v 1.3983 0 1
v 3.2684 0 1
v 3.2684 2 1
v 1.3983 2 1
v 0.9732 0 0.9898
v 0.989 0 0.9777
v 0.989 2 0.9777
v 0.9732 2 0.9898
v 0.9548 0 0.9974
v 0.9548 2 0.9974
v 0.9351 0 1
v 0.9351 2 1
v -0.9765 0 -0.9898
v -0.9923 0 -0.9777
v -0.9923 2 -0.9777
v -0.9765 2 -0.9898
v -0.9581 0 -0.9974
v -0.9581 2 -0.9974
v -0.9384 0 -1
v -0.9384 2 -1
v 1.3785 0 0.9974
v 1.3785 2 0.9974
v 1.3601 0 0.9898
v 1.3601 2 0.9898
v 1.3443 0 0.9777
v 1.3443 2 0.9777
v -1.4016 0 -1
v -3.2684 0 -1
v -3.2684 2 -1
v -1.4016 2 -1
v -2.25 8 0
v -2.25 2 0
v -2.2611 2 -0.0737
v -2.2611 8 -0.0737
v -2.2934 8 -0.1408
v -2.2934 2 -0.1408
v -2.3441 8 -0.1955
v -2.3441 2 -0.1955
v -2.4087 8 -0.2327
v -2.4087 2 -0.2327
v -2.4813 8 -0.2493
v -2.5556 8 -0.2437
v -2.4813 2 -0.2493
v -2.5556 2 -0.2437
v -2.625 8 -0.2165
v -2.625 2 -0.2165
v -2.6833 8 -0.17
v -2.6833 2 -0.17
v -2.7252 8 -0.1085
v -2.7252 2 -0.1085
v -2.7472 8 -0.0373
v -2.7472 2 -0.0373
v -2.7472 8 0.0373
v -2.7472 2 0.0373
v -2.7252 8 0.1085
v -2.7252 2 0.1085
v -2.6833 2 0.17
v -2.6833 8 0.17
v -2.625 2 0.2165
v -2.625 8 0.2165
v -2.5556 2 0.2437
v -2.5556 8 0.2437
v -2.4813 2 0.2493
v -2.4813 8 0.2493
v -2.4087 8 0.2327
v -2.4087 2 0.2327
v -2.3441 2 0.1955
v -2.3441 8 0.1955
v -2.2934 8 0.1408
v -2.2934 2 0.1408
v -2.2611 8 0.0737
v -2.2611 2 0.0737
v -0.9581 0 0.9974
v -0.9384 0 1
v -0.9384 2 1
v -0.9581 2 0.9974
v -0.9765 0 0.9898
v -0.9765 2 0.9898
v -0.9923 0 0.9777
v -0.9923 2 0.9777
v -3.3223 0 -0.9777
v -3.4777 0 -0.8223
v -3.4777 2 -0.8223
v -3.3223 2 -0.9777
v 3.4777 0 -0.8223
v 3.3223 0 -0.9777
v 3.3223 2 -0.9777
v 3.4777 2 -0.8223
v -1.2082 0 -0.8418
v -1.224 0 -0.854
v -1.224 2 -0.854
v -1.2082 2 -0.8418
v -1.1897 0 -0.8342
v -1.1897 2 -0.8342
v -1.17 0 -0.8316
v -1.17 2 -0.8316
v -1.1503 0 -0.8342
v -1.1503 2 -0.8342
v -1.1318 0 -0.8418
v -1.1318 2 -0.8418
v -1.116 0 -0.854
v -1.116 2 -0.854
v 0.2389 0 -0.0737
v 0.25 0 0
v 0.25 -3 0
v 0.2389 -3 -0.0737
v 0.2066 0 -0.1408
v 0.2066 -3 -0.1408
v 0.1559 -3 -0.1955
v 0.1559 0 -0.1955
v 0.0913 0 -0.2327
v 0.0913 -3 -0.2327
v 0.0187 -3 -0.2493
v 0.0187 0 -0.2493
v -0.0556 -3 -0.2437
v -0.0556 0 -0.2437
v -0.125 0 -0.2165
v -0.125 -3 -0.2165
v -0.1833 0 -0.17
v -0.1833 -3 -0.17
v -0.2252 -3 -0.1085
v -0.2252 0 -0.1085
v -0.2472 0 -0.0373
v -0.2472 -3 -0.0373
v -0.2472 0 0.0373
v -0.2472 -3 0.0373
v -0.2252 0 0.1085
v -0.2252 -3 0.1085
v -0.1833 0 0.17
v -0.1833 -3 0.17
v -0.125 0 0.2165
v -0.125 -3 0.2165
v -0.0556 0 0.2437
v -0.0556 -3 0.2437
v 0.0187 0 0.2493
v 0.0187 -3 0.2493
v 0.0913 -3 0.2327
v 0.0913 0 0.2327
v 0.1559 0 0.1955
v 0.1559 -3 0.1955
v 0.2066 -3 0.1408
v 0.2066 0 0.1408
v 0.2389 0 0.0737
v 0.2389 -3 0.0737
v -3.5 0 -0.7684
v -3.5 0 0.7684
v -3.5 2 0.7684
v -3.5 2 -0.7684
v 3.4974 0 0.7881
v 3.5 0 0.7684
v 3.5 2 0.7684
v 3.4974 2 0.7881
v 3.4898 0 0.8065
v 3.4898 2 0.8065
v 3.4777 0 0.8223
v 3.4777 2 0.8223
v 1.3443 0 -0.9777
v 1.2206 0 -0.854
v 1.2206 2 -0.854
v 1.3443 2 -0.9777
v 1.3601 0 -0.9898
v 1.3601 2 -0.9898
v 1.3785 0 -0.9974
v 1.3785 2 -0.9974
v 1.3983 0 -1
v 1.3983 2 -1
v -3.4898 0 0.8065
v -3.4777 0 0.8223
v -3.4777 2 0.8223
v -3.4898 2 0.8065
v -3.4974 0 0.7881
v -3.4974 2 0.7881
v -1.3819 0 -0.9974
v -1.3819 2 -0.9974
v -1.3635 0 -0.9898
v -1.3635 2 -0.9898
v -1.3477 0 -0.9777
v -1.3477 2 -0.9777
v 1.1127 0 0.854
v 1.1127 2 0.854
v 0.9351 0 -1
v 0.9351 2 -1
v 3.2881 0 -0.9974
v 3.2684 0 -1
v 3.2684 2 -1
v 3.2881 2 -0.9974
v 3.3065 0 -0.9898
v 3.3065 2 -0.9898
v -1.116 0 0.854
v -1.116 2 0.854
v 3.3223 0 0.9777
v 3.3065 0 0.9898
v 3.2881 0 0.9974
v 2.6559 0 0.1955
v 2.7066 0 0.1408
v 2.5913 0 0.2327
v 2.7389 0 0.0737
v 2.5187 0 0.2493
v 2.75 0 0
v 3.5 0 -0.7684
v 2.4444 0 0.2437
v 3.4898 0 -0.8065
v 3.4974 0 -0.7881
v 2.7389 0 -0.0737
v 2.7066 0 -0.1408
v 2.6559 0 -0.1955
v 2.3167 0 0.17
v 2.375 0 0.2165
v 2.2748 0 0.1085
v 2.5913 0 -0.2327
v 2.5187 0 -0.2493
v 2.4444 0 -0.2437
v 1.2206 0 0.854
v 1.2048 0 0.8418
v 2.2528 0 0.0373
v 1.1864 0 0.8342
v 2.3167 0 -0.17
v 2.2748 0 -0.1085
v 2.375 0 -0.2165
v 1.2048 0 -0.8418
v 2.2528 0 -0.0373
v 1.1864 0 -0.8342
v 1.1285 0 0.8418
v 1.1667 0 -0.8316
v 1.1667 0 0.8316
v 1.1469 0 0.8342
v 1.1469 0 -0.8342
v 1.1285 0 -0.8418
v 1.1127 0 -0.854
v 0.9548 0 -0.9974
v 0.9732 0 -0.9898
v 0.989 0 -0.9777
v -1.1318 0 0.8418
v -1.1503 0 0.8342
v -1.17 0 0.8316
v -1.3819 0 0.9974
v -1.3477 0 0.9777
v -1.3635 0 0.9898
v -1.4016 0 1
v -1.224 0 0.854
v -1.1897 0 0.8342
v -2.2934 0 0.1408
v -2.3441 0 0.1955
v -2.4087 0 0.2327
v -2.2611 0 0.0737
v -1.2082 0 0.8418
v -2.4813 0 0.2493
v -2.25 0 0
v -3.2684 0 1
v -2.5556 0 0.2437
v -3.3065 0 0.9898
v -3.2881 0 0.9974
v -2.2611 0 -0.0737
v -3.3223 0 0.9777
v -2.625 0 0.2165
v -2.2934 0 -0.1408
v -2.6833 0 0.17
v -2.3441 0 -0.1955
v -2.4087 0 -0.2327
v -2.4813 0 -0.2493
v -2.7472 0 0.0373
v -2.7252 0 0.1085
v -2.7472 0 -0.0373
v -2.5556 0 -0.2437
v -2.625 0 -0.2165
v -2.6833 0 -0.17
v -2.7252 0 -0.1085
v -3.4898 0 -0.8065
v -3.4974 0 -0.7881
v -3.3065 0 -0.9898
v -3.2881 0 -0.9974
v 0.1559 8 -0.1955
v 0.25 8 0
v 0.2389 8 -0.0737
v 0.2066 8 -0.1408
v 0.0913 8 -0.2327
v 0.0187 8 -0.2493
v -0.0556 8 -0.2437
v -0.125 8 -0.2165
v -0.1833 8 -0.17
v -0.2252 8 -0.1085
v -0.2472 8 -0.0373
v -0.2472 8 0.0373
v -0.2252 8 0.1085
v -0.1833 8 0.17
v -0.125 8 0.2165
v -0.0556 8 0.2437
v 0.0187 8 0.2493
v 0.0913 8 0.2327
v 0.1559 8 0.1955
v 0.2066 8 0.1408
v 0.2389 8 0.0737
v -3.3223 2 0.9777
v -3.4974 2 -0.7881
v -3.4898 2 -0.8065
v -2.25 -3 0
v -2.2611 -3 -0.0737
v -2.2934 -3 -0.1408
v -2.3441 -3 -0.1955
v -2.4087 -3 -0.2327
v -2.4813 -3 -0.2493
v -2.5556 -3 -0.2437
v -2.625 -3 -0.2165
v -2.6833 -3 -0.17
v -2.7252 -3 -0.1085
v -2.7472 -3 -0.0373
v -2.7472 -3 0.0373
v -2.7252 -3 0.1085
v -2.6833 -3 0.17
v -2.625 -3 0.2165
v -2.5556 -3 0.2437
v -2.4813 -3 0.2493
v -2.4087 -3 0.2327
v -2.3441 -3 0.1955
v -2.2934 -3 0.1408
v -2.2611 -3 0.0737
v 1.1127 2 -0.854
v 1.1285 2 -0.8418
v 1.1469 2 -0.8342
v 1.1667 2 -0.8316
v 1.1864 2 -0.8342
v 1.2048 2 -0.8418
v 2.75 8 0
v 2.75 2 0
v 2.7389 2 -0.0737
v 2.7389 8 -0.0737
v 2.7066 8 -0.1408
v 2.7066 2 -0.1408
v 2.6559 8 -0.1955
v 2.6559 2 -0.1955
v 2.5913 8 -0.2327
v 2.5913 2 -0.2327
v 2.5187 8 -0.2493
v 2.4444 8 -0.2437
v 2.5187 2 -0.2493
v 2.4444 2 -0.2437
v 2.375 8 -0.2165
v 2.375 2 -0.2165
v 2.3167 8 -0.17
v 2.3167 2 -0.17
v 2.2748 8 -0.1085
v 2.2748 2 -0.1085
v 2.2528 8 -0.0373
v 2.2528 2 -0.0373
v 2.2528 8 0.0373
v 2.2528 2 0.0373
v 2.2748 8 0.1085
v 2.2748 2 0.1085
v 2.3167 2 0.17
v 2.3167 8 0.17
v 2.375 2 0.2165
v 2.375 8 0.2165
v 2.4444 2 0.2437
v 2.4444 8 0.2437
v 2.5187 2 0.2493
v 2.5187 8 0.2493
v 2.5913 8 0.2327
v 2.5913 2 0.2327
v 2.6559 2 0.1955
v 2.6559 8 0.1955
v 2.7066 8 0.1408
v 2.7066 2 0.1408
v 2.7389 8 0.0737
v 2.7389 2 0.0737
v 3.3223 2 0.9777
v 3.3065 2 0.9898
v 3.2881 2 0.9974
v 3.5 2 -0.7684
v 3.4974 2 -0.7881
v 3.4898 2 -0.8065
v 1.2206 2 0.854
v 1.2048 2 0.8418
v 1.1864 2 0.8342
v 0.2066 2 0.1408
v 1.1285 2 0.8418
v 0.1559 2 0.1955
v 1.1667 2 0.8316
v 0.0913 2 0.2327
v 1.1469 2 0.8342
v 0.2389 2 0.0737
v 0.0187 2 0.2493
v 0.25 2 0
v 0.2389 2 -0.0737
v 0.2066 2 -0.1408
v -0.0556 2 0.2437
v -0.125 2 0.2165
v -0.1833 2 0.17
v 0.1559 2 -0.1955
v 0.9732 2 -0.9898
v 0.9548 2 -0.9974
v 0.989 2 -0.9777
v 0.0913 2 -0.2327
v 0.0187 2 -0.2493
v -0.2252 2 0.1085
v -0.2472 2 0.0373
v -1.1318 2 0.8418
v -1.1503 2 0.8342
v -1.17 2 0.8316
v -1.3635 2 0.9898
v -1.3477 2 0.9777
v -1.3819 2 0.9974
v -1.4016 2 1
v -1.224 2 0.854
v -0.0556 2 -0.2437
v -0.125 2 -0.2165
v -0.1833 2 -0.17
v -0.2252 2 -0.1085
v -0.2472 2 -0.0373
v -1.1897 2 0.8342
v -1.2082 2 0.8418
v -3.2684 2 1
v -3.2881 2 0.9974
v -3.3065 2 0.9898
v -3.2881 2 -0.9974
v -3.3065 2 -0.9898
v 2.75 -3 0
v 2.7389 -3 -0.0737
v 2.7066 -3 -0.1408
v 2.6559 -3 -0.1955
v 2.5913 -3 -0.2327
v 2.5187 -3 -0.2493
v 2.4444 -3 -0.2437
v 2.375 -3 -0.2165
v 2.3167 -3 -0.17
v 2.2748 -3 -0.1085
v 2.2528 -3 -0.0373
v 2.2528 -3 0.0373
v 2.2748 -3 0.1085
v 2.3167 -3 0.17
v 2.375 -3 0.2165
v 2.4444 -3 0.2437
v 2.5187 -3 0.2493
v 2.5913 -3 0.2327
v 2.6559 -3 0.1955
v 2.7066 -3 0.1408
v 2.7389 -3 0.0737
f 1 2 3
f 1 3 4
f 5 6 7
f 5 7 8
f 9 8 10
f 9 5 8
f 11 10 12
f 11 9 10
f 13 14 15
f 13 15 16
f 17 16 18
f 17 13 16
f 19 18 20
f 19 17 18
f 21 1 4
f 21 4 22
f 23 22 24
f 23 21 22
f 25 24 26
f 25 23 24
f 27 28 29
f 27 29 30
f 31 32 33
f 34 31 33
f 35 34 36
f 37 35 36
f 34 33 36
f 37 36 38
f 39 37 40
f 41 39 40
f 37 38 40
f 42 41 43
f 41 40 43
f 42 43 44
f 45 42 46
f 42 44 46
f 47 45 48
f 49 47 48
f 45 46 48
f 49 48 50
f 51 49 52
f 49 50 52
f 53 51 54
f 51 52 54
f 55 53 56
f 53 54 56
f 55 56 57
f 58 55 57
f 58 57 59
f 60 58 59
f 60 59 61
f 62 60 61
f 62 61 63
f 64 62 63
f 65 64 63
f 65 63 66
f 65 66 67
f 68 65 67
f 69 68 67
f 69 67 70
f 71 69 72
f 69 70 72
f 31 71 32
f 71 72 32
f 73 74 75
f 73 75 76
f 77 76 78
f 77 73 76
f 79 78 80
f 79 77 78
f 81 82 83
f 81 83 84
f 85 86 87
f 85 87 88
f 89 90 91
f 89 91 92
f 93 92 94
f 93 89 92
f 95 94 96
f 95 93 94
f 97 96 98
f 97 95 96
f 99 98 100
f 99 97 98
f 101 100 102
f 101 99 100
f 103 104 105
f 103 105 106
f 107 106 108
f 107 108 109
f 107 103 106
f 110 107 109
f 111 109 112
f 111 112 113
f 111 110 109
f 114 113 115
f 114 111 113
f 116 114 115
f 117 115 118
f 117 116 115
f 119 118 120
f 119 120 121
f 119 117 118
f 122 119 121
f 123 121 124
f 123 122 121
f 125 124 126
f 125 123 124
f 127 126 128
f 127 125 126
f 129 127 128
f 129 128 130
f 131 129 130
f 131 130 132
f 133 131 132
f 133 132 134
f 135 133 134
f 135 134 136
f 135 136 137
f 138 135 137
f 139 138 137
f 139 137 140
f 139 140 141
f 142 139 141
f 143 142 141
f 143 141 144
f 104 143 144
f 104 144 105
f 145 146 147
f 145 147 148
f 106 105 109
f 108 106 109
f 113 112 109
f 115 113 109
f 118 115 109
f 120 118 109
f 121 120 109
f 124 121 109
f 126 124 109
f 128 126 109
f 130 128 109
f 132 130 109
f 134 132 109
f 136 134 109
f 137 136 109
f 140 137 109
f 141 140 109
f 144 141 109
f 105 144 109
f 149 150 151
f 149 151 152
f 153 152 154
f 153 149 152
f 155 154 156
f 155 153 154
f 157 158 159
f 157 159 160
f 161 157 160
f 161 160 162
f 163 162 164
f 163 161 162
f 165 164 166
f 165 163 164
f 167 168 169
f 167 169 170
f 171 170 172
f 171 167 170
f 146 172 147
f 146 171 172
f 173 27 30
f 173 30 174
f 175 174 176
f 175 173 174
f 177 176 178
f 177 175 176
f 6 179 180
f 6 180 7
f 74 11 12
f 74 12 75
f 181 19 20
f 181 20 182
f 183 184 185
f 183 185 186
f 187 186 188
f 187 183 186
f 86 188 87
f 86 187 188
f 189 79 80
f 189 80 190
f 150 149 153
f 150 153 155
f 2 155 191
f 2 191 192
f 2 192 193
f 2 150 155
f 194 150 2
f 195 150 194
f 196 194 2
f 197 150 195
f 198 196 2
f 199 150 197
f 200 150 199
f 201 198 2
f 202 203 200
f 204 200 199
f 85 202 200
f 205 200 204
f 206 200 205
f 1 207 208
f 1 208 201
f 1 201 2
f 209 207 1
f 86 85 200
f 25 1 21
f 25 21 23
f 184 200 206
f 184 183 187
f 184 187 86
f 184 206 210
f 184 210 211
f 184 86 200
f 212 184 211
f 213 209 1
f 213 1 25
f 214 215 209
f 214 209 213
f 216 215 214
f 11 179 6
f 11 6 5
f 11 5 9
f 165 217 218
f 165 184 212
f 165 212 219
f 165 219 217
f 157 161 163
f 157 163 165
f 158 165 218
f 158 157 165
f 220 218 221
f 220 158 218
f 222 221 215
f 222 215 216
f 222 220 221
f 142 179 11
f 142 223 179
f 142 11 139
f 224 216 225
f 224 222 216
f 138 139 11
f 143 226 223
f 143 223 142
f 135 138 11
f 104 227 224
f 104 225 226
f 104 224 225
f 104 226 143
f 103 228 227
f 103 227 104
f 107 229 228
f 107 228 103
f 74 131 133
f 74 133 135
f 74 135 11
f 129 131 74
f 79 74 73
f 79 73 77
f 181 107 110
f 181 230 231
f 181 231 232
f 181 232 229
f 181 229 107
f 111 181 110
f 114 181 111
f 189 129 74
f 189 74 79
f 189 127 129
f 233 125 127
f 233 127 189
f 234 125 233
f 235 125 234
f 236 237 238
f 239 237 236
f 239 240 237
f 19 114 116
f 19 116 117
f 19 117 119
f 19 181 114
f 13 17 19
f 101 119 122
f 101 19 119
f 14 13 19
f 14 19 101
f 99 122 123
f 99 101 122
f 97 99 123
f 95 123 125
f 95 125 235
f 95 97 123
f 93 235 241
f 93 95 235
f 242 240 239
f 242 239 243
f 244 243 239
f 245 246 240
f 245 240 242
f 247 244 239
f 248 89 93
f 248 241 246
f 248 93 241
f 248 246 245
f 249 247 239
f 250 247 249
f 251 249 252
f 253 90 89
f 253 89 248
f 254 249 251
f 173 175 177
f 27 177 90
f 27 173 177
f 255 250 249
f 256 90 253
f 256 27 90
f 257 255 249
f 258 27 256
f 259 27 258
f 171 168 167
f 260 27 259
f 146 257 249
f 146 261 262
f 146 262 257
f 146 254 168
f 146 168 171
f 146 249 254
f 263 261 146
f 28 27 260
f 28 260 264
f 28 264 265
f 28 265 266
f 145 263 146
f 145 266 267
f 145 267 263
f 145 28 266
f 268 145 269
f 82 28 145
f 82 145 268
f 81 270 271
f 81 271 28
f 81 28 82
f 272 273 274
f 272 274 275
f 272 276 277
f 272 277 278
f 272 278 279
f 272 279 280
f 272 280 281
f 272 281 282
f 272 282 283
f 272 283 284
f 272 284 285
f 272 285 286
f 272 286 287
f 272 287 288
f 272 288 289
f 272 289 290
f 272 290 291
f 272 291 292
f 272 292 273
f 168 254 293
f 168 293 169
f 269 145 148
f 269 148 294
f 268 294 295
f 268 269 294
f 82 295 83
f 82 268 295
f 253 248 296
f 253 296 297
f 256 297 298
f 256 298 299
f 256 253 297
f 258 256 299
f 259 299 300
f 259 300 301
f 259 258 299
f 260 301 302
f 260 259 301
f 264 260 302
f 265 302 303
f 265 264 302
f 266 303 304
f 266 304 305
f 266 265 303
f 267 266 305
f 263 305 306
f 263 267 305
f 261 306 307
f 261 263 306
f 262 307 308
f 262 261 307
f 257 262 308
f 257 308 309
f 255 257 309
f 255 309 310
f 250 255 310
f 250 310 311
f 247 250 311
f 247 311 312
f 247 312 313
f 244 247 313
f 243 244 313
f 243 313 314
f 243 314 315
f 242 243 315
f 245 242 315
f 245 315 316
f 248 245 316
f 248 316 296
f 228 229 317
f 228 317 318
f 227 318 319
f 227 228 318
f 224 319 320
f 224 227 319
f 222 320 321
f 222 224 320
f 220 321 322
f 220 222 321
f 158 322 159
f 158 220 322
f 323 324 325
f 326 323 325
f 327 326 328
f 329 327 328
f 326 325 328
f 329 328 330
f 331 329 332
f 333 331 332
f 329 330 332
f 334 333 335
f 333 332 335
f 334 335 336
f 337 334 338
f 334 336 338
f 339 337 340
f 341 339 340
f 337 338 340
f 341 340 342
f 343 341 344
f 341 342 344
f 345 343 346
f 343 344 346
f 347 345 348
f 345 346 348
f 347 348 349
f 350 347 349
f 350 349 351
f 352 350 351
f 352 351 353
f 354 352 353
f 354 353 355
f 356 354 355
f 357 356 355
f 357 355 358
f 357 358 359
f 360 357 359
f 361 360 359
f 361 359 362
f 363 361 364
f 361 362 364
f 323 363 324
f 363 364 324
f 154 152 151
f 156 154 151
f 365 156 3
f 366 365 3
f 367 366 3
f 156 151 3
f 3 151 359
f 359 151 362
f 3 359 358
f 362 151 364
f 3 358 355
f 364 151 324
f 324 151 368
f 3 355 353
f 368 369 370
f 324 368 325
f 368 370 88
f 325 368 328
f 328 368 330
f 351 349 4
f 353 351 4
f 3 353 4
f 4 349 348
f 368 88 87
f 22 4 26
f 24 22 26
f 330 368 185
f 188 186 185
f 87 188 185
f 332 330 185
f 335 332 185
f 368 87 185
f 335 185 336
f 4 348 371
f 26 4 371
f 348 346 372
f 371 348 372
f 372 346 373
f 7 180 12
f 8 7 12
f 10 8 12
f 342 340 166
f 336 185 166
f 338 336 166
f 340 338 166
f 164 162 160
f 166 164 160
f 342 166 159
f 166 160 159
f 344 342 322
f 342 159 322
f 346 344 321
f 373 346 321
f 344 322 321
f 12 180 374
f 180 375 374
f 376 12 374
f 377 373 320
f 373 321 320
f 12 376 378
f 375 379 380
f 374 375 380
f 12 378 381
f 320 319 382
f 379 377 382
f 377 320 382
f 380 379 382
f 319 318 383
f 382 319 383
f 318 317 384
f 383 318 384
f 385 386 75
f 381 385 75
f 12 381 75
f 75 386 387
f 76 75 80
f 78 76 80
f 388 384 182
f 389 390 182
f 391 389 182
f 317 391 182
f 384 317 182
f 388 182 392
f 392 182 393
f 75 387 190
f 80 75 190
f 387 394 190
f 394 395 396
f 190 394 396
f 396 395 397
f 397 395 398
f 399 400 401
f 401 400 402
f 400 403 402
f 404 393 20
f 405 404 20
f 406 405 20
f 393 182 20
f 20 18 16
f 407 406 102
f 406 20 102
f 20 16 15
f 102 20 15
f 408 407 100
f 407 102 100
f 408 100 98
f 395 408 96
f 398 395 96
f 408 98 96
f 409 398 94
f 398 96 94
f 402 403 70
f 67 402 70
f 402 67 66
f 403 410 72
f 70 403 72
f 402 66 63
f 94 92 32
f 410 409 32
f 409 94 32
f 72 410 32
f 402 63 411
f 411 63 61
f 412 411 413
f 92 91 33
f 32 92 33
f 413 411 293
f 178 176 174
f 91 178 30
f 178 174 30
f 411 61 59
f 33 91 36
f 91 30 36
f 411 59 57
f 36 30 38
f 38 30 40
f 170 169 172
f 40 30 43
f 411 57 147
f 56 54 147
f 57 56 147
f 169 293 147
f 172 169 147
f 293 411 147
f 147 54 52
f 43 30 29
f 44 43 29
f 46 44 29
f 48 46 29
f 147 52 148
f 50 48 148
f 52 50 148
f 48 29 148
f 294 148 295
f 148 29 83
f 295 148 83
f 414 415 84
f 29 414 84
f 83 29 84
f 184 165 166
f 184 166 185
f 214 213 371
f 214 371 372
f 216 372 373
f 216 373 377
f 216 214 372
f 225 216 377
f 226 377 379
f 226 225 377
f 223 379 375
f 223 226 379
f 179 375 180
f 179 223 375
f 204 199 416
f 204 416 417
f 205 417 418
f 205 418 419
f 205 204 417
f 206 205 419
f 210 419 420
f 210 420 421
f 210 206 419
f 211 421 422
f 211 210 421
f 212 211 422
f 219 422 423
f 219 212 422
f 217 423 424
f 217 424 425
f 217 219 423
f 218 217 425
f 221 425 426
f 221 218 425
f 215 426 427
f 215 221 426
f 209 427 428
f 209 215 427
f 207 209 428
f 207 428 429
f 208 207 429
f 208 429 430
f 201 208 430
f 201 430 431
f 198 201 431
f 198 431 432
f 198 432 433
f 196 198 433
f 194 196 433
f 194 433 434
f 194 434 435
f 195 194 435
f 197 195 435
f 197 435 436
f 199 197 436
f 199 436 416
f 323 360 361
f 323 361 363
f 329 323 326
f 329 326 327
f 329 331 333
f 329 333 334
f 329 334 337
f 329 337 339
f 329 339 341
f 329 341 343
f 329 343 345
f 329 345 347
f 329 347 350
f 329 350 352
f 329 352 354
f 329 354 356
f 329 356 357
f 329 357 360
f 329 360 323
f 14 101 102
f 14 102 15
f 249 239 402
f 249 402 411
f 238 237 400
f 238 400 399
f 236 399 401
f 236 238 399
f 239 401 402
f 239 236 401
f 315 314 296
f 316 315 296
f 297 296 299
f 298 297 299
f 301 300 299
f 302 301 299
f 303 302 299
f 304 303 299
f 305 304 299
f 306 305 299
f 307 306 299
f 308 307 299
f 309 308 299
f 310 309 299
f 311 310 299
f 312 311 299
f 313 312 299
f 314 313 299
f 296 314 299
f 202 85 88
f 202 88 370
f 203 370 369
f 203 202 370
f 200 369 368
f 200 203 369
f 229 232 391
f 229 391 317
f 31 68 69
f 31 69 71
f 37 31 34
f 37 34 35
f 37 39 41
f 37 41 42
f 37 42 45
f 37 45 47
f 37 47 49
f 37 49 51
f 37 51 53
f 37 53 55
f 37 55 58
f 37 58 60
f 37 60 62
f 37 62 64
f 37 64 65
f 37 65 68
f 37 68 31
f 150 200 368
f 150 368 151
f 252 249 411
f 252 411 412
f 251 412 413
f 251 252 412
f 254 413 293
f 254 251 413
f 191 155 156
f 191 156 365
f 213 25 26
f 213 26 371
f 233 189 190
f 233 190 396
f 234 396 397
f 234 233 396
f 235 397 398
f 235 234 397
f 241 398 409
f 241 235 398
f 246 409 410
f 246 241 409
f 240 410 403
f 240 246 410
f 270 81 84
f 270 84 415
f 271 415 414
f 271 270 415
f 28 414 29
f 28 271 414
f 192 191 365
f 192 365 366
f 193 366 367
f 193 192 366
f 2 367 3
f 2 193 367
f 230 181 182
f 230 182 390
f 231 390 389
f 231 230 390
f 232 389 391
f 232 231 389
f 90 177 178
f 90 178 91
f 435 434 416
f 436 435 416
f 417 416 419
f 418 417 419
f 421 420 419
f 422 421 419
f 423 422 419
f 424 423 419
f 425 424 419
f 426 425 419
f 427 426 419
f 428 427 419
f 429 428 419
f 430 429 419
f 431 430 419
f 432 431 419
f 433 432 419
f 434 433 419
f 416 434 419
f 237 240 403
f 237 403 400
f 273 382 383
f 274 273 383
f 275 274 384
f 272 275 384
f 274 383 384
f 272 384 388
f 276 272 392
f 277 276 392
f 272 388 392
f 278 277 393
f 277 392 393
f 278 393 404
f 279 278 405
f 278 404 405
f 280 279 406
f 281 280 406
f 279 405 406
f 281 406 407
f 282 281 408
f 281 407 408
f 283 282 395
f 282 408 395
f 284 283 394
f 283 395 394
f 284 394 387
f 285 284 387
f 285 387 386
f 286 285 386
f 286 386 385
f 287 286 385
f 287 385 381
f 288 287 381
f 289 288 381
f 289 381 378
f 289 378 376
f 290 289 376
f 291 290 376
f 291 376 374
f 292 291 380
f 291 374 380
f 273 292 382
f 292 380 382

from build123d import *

# Parameters (mm, degrees)
IZIM1_R                          = 0.25
Y_KSEKLIK_EKSTR_ZYON1_DEPTH      = 2
IZIM3_R                          = 0.25
Y_KSEKLIK_EKSTR_ZYON3_DEPTH      = 6
Y_KSEKLIK_EKSTR_ZYON3_DEPTH_BACK = 5


with BuildPart() as part:
    # Çizim1 → Yükseklik-Ekstrüzyon1 (new body)
    with BuildSketch(Plane(origin=(0, 0, 0), x_dir=(1, 0, 0), z_dir=(0, 1, 0))):
        with BuildLine():
            Line((-3.477652227, 0.822347773), (-3.322347773, 0.977652227))
            ThreePointArc((-3.322347773, 0.977652227), (-3.297594249, 0.994192003), (-3.268395476, 1))
            Line((-3.268395476, 1), (-1.401604524, 1))
            ThreePointArc((-1.401604524, 1), (-1.372405751, 0.994192003), (-1.347652227, 0.977652227))
            Line((-1.347652227, 0.977652227), (-1.223952297, 0.853952297))
            ThreePointArc((-1.223952297, 0.853952297), (-1.17, 0.831604524), (-1.116047703, 0.853952297))
            Line((-1.116047703, 0.853952297), (-0.992347773, 0.977652227))
            ThreePointArc((-0.992347773, 0.977652227), (-0.967594249, 0.994192003), (-0.938395476, 1))
            Line((-0.938395476, 1), (0.935062143, 1))
            ThreePointArc((0.935062143, 1), (0.964260916, 0.994192003), (0.98901444, 0.977652227))
            Line((0.98901444, 0.977652227), (1.11271437, 0.853952297))
            ThreePointArc((1.11271437, 0.853952297), (1.166666667, 0.831604524), (1.220618963, 0.853952297))
            Line((1.220618963, 0.853952297), (1.344318894, 0.977652227))
            ThreePointArc((1.344318894, 0.977652227), (1.369072418, 0.994192003), (1.39827119, 1))
            Line((1.39827119, 1), (3.268395476, 1))
            ThreePointArc((3.268395476, 1), (3.297594249, 0.994192003), (3.322347773, 0.977652227))
            Line((3.322347773, 0.977652227), (3.477652227, 0.822347773))
            ThreePointArc((3.477652227, 0.822347773), (3.494192003, 0.797594249), (3.5, 0.768395476))
            Line((3.5, 0.768395476), (3.5, -0.768395476))
            ThreePointArc((3.5, -0.768395476), (3.494192003, -0.797594249), (3.477652227, -0.822347773))
            Line((3.477652227, -0.822347773), (3.322347773, -0.977652227))
            ThreePointArc((3.322347773, -0.977652227), (3.297594249, -0.994192003), (3.268395476, -1))
            Line((3.268395476, -1), (1.39827119, -1))
            ThreePointArc((1.39827119, -1), (1.369072418, -0.994192003), (1.344318894, -0.977652227))
            Line((1.344318894, -0.977652227), (1.220618963, -0.853952297))
            ThreePointArc((1.220618963, -0.853952297), (1.166666667, -0.831604524), (1.11271437, -0.853952297))
            Line((1.11271437, -0.853952297), (0.98901444, -0.977652227))
            ThreePointArc((0.98901444, -0.977652227), (0.964260916, -0.994192003), (0.935062143, -1))
            Line((0.935062143, -1), (-0.938395476, -1))
            ThreePointArc((-0.938395476, -1), (-0.967594249, -0.994192003), (-0.992347773, -0.977652227))
            Line((-0.992347773, -0.977652227), (-1.116047703, -0.853952297))
            ThreePointArc((-1.116047703, -0.853952297), (-1.17, -0.831604524), (-1.223952297, -0.853952297))
            Line((-1.223952297, -0.853952297), (-1.347652227, -0.977652227))
            ThreePointArc((-1.347652227, -0.977652227), (-1.372405751, -0.994192003), (-1.401604524, -1))
            Line((-1.401604524, -1), (-3.268395476, -1))
            ThreePointArc((-3.268395476, -1), (-3.297594249, -0.994192003), (-3.322347773, -0.977652227))
            Line((-3.322347773, -0.977652227), (-3.477652227, -0.822347773))
            ThreePointArc((-3.477652227, -0.822347773), (-3.494192003, -0.797594249), (-3.5, -0.768395476))
            Line((-3.5, -0.768395476), (-3.5, 0.768395476))
            ThreePointArc((-3.5, 0.768395476), (-3.494192003, 0.797594249), (-3.477652227, 0.822347773))
        make_face()
        Circle(IZIM1_R, mode=Mode.SUBTRACT)
        with Locations((-2.5, 0)):
            Circle(IZIM1_R, mode=Mode.SUBTRACT)
        with Locations((2.5, 0)):
            Circle(IZIM1_R, mode=Mode.SUBTRACT)
    extrude(amount=Y_KSEKLIK_EKSTR_ZYON1_DEPTH)

    # Çizim3 → Yükseklik-Ekstrüzyon3 (add, two sides)
    with BuildSketch(Plane(origin=(0, 2, 0), x_dir=(1, 0, 0), z_dir=(0, 1, 0))) as y_kseklik_ekstr_zyon3_sk:
        with Locations((-2.5, 0)):
            Circle(IZIM3_R)
        Circle(IZIM3_R)
        with Locations((2.5, 0)):
            Circle(IZIM3_R)
    extrude(amount=Y_KSEKLIK_EKSTR_ZYON3_DEPTH)
    extrude(y_kseklik_ekstr_zyon3_sk.sketch, amount=-Y_KSEKLIK_EKSTR_ZYON3_DEPTH_BACK)


solid = part.part
